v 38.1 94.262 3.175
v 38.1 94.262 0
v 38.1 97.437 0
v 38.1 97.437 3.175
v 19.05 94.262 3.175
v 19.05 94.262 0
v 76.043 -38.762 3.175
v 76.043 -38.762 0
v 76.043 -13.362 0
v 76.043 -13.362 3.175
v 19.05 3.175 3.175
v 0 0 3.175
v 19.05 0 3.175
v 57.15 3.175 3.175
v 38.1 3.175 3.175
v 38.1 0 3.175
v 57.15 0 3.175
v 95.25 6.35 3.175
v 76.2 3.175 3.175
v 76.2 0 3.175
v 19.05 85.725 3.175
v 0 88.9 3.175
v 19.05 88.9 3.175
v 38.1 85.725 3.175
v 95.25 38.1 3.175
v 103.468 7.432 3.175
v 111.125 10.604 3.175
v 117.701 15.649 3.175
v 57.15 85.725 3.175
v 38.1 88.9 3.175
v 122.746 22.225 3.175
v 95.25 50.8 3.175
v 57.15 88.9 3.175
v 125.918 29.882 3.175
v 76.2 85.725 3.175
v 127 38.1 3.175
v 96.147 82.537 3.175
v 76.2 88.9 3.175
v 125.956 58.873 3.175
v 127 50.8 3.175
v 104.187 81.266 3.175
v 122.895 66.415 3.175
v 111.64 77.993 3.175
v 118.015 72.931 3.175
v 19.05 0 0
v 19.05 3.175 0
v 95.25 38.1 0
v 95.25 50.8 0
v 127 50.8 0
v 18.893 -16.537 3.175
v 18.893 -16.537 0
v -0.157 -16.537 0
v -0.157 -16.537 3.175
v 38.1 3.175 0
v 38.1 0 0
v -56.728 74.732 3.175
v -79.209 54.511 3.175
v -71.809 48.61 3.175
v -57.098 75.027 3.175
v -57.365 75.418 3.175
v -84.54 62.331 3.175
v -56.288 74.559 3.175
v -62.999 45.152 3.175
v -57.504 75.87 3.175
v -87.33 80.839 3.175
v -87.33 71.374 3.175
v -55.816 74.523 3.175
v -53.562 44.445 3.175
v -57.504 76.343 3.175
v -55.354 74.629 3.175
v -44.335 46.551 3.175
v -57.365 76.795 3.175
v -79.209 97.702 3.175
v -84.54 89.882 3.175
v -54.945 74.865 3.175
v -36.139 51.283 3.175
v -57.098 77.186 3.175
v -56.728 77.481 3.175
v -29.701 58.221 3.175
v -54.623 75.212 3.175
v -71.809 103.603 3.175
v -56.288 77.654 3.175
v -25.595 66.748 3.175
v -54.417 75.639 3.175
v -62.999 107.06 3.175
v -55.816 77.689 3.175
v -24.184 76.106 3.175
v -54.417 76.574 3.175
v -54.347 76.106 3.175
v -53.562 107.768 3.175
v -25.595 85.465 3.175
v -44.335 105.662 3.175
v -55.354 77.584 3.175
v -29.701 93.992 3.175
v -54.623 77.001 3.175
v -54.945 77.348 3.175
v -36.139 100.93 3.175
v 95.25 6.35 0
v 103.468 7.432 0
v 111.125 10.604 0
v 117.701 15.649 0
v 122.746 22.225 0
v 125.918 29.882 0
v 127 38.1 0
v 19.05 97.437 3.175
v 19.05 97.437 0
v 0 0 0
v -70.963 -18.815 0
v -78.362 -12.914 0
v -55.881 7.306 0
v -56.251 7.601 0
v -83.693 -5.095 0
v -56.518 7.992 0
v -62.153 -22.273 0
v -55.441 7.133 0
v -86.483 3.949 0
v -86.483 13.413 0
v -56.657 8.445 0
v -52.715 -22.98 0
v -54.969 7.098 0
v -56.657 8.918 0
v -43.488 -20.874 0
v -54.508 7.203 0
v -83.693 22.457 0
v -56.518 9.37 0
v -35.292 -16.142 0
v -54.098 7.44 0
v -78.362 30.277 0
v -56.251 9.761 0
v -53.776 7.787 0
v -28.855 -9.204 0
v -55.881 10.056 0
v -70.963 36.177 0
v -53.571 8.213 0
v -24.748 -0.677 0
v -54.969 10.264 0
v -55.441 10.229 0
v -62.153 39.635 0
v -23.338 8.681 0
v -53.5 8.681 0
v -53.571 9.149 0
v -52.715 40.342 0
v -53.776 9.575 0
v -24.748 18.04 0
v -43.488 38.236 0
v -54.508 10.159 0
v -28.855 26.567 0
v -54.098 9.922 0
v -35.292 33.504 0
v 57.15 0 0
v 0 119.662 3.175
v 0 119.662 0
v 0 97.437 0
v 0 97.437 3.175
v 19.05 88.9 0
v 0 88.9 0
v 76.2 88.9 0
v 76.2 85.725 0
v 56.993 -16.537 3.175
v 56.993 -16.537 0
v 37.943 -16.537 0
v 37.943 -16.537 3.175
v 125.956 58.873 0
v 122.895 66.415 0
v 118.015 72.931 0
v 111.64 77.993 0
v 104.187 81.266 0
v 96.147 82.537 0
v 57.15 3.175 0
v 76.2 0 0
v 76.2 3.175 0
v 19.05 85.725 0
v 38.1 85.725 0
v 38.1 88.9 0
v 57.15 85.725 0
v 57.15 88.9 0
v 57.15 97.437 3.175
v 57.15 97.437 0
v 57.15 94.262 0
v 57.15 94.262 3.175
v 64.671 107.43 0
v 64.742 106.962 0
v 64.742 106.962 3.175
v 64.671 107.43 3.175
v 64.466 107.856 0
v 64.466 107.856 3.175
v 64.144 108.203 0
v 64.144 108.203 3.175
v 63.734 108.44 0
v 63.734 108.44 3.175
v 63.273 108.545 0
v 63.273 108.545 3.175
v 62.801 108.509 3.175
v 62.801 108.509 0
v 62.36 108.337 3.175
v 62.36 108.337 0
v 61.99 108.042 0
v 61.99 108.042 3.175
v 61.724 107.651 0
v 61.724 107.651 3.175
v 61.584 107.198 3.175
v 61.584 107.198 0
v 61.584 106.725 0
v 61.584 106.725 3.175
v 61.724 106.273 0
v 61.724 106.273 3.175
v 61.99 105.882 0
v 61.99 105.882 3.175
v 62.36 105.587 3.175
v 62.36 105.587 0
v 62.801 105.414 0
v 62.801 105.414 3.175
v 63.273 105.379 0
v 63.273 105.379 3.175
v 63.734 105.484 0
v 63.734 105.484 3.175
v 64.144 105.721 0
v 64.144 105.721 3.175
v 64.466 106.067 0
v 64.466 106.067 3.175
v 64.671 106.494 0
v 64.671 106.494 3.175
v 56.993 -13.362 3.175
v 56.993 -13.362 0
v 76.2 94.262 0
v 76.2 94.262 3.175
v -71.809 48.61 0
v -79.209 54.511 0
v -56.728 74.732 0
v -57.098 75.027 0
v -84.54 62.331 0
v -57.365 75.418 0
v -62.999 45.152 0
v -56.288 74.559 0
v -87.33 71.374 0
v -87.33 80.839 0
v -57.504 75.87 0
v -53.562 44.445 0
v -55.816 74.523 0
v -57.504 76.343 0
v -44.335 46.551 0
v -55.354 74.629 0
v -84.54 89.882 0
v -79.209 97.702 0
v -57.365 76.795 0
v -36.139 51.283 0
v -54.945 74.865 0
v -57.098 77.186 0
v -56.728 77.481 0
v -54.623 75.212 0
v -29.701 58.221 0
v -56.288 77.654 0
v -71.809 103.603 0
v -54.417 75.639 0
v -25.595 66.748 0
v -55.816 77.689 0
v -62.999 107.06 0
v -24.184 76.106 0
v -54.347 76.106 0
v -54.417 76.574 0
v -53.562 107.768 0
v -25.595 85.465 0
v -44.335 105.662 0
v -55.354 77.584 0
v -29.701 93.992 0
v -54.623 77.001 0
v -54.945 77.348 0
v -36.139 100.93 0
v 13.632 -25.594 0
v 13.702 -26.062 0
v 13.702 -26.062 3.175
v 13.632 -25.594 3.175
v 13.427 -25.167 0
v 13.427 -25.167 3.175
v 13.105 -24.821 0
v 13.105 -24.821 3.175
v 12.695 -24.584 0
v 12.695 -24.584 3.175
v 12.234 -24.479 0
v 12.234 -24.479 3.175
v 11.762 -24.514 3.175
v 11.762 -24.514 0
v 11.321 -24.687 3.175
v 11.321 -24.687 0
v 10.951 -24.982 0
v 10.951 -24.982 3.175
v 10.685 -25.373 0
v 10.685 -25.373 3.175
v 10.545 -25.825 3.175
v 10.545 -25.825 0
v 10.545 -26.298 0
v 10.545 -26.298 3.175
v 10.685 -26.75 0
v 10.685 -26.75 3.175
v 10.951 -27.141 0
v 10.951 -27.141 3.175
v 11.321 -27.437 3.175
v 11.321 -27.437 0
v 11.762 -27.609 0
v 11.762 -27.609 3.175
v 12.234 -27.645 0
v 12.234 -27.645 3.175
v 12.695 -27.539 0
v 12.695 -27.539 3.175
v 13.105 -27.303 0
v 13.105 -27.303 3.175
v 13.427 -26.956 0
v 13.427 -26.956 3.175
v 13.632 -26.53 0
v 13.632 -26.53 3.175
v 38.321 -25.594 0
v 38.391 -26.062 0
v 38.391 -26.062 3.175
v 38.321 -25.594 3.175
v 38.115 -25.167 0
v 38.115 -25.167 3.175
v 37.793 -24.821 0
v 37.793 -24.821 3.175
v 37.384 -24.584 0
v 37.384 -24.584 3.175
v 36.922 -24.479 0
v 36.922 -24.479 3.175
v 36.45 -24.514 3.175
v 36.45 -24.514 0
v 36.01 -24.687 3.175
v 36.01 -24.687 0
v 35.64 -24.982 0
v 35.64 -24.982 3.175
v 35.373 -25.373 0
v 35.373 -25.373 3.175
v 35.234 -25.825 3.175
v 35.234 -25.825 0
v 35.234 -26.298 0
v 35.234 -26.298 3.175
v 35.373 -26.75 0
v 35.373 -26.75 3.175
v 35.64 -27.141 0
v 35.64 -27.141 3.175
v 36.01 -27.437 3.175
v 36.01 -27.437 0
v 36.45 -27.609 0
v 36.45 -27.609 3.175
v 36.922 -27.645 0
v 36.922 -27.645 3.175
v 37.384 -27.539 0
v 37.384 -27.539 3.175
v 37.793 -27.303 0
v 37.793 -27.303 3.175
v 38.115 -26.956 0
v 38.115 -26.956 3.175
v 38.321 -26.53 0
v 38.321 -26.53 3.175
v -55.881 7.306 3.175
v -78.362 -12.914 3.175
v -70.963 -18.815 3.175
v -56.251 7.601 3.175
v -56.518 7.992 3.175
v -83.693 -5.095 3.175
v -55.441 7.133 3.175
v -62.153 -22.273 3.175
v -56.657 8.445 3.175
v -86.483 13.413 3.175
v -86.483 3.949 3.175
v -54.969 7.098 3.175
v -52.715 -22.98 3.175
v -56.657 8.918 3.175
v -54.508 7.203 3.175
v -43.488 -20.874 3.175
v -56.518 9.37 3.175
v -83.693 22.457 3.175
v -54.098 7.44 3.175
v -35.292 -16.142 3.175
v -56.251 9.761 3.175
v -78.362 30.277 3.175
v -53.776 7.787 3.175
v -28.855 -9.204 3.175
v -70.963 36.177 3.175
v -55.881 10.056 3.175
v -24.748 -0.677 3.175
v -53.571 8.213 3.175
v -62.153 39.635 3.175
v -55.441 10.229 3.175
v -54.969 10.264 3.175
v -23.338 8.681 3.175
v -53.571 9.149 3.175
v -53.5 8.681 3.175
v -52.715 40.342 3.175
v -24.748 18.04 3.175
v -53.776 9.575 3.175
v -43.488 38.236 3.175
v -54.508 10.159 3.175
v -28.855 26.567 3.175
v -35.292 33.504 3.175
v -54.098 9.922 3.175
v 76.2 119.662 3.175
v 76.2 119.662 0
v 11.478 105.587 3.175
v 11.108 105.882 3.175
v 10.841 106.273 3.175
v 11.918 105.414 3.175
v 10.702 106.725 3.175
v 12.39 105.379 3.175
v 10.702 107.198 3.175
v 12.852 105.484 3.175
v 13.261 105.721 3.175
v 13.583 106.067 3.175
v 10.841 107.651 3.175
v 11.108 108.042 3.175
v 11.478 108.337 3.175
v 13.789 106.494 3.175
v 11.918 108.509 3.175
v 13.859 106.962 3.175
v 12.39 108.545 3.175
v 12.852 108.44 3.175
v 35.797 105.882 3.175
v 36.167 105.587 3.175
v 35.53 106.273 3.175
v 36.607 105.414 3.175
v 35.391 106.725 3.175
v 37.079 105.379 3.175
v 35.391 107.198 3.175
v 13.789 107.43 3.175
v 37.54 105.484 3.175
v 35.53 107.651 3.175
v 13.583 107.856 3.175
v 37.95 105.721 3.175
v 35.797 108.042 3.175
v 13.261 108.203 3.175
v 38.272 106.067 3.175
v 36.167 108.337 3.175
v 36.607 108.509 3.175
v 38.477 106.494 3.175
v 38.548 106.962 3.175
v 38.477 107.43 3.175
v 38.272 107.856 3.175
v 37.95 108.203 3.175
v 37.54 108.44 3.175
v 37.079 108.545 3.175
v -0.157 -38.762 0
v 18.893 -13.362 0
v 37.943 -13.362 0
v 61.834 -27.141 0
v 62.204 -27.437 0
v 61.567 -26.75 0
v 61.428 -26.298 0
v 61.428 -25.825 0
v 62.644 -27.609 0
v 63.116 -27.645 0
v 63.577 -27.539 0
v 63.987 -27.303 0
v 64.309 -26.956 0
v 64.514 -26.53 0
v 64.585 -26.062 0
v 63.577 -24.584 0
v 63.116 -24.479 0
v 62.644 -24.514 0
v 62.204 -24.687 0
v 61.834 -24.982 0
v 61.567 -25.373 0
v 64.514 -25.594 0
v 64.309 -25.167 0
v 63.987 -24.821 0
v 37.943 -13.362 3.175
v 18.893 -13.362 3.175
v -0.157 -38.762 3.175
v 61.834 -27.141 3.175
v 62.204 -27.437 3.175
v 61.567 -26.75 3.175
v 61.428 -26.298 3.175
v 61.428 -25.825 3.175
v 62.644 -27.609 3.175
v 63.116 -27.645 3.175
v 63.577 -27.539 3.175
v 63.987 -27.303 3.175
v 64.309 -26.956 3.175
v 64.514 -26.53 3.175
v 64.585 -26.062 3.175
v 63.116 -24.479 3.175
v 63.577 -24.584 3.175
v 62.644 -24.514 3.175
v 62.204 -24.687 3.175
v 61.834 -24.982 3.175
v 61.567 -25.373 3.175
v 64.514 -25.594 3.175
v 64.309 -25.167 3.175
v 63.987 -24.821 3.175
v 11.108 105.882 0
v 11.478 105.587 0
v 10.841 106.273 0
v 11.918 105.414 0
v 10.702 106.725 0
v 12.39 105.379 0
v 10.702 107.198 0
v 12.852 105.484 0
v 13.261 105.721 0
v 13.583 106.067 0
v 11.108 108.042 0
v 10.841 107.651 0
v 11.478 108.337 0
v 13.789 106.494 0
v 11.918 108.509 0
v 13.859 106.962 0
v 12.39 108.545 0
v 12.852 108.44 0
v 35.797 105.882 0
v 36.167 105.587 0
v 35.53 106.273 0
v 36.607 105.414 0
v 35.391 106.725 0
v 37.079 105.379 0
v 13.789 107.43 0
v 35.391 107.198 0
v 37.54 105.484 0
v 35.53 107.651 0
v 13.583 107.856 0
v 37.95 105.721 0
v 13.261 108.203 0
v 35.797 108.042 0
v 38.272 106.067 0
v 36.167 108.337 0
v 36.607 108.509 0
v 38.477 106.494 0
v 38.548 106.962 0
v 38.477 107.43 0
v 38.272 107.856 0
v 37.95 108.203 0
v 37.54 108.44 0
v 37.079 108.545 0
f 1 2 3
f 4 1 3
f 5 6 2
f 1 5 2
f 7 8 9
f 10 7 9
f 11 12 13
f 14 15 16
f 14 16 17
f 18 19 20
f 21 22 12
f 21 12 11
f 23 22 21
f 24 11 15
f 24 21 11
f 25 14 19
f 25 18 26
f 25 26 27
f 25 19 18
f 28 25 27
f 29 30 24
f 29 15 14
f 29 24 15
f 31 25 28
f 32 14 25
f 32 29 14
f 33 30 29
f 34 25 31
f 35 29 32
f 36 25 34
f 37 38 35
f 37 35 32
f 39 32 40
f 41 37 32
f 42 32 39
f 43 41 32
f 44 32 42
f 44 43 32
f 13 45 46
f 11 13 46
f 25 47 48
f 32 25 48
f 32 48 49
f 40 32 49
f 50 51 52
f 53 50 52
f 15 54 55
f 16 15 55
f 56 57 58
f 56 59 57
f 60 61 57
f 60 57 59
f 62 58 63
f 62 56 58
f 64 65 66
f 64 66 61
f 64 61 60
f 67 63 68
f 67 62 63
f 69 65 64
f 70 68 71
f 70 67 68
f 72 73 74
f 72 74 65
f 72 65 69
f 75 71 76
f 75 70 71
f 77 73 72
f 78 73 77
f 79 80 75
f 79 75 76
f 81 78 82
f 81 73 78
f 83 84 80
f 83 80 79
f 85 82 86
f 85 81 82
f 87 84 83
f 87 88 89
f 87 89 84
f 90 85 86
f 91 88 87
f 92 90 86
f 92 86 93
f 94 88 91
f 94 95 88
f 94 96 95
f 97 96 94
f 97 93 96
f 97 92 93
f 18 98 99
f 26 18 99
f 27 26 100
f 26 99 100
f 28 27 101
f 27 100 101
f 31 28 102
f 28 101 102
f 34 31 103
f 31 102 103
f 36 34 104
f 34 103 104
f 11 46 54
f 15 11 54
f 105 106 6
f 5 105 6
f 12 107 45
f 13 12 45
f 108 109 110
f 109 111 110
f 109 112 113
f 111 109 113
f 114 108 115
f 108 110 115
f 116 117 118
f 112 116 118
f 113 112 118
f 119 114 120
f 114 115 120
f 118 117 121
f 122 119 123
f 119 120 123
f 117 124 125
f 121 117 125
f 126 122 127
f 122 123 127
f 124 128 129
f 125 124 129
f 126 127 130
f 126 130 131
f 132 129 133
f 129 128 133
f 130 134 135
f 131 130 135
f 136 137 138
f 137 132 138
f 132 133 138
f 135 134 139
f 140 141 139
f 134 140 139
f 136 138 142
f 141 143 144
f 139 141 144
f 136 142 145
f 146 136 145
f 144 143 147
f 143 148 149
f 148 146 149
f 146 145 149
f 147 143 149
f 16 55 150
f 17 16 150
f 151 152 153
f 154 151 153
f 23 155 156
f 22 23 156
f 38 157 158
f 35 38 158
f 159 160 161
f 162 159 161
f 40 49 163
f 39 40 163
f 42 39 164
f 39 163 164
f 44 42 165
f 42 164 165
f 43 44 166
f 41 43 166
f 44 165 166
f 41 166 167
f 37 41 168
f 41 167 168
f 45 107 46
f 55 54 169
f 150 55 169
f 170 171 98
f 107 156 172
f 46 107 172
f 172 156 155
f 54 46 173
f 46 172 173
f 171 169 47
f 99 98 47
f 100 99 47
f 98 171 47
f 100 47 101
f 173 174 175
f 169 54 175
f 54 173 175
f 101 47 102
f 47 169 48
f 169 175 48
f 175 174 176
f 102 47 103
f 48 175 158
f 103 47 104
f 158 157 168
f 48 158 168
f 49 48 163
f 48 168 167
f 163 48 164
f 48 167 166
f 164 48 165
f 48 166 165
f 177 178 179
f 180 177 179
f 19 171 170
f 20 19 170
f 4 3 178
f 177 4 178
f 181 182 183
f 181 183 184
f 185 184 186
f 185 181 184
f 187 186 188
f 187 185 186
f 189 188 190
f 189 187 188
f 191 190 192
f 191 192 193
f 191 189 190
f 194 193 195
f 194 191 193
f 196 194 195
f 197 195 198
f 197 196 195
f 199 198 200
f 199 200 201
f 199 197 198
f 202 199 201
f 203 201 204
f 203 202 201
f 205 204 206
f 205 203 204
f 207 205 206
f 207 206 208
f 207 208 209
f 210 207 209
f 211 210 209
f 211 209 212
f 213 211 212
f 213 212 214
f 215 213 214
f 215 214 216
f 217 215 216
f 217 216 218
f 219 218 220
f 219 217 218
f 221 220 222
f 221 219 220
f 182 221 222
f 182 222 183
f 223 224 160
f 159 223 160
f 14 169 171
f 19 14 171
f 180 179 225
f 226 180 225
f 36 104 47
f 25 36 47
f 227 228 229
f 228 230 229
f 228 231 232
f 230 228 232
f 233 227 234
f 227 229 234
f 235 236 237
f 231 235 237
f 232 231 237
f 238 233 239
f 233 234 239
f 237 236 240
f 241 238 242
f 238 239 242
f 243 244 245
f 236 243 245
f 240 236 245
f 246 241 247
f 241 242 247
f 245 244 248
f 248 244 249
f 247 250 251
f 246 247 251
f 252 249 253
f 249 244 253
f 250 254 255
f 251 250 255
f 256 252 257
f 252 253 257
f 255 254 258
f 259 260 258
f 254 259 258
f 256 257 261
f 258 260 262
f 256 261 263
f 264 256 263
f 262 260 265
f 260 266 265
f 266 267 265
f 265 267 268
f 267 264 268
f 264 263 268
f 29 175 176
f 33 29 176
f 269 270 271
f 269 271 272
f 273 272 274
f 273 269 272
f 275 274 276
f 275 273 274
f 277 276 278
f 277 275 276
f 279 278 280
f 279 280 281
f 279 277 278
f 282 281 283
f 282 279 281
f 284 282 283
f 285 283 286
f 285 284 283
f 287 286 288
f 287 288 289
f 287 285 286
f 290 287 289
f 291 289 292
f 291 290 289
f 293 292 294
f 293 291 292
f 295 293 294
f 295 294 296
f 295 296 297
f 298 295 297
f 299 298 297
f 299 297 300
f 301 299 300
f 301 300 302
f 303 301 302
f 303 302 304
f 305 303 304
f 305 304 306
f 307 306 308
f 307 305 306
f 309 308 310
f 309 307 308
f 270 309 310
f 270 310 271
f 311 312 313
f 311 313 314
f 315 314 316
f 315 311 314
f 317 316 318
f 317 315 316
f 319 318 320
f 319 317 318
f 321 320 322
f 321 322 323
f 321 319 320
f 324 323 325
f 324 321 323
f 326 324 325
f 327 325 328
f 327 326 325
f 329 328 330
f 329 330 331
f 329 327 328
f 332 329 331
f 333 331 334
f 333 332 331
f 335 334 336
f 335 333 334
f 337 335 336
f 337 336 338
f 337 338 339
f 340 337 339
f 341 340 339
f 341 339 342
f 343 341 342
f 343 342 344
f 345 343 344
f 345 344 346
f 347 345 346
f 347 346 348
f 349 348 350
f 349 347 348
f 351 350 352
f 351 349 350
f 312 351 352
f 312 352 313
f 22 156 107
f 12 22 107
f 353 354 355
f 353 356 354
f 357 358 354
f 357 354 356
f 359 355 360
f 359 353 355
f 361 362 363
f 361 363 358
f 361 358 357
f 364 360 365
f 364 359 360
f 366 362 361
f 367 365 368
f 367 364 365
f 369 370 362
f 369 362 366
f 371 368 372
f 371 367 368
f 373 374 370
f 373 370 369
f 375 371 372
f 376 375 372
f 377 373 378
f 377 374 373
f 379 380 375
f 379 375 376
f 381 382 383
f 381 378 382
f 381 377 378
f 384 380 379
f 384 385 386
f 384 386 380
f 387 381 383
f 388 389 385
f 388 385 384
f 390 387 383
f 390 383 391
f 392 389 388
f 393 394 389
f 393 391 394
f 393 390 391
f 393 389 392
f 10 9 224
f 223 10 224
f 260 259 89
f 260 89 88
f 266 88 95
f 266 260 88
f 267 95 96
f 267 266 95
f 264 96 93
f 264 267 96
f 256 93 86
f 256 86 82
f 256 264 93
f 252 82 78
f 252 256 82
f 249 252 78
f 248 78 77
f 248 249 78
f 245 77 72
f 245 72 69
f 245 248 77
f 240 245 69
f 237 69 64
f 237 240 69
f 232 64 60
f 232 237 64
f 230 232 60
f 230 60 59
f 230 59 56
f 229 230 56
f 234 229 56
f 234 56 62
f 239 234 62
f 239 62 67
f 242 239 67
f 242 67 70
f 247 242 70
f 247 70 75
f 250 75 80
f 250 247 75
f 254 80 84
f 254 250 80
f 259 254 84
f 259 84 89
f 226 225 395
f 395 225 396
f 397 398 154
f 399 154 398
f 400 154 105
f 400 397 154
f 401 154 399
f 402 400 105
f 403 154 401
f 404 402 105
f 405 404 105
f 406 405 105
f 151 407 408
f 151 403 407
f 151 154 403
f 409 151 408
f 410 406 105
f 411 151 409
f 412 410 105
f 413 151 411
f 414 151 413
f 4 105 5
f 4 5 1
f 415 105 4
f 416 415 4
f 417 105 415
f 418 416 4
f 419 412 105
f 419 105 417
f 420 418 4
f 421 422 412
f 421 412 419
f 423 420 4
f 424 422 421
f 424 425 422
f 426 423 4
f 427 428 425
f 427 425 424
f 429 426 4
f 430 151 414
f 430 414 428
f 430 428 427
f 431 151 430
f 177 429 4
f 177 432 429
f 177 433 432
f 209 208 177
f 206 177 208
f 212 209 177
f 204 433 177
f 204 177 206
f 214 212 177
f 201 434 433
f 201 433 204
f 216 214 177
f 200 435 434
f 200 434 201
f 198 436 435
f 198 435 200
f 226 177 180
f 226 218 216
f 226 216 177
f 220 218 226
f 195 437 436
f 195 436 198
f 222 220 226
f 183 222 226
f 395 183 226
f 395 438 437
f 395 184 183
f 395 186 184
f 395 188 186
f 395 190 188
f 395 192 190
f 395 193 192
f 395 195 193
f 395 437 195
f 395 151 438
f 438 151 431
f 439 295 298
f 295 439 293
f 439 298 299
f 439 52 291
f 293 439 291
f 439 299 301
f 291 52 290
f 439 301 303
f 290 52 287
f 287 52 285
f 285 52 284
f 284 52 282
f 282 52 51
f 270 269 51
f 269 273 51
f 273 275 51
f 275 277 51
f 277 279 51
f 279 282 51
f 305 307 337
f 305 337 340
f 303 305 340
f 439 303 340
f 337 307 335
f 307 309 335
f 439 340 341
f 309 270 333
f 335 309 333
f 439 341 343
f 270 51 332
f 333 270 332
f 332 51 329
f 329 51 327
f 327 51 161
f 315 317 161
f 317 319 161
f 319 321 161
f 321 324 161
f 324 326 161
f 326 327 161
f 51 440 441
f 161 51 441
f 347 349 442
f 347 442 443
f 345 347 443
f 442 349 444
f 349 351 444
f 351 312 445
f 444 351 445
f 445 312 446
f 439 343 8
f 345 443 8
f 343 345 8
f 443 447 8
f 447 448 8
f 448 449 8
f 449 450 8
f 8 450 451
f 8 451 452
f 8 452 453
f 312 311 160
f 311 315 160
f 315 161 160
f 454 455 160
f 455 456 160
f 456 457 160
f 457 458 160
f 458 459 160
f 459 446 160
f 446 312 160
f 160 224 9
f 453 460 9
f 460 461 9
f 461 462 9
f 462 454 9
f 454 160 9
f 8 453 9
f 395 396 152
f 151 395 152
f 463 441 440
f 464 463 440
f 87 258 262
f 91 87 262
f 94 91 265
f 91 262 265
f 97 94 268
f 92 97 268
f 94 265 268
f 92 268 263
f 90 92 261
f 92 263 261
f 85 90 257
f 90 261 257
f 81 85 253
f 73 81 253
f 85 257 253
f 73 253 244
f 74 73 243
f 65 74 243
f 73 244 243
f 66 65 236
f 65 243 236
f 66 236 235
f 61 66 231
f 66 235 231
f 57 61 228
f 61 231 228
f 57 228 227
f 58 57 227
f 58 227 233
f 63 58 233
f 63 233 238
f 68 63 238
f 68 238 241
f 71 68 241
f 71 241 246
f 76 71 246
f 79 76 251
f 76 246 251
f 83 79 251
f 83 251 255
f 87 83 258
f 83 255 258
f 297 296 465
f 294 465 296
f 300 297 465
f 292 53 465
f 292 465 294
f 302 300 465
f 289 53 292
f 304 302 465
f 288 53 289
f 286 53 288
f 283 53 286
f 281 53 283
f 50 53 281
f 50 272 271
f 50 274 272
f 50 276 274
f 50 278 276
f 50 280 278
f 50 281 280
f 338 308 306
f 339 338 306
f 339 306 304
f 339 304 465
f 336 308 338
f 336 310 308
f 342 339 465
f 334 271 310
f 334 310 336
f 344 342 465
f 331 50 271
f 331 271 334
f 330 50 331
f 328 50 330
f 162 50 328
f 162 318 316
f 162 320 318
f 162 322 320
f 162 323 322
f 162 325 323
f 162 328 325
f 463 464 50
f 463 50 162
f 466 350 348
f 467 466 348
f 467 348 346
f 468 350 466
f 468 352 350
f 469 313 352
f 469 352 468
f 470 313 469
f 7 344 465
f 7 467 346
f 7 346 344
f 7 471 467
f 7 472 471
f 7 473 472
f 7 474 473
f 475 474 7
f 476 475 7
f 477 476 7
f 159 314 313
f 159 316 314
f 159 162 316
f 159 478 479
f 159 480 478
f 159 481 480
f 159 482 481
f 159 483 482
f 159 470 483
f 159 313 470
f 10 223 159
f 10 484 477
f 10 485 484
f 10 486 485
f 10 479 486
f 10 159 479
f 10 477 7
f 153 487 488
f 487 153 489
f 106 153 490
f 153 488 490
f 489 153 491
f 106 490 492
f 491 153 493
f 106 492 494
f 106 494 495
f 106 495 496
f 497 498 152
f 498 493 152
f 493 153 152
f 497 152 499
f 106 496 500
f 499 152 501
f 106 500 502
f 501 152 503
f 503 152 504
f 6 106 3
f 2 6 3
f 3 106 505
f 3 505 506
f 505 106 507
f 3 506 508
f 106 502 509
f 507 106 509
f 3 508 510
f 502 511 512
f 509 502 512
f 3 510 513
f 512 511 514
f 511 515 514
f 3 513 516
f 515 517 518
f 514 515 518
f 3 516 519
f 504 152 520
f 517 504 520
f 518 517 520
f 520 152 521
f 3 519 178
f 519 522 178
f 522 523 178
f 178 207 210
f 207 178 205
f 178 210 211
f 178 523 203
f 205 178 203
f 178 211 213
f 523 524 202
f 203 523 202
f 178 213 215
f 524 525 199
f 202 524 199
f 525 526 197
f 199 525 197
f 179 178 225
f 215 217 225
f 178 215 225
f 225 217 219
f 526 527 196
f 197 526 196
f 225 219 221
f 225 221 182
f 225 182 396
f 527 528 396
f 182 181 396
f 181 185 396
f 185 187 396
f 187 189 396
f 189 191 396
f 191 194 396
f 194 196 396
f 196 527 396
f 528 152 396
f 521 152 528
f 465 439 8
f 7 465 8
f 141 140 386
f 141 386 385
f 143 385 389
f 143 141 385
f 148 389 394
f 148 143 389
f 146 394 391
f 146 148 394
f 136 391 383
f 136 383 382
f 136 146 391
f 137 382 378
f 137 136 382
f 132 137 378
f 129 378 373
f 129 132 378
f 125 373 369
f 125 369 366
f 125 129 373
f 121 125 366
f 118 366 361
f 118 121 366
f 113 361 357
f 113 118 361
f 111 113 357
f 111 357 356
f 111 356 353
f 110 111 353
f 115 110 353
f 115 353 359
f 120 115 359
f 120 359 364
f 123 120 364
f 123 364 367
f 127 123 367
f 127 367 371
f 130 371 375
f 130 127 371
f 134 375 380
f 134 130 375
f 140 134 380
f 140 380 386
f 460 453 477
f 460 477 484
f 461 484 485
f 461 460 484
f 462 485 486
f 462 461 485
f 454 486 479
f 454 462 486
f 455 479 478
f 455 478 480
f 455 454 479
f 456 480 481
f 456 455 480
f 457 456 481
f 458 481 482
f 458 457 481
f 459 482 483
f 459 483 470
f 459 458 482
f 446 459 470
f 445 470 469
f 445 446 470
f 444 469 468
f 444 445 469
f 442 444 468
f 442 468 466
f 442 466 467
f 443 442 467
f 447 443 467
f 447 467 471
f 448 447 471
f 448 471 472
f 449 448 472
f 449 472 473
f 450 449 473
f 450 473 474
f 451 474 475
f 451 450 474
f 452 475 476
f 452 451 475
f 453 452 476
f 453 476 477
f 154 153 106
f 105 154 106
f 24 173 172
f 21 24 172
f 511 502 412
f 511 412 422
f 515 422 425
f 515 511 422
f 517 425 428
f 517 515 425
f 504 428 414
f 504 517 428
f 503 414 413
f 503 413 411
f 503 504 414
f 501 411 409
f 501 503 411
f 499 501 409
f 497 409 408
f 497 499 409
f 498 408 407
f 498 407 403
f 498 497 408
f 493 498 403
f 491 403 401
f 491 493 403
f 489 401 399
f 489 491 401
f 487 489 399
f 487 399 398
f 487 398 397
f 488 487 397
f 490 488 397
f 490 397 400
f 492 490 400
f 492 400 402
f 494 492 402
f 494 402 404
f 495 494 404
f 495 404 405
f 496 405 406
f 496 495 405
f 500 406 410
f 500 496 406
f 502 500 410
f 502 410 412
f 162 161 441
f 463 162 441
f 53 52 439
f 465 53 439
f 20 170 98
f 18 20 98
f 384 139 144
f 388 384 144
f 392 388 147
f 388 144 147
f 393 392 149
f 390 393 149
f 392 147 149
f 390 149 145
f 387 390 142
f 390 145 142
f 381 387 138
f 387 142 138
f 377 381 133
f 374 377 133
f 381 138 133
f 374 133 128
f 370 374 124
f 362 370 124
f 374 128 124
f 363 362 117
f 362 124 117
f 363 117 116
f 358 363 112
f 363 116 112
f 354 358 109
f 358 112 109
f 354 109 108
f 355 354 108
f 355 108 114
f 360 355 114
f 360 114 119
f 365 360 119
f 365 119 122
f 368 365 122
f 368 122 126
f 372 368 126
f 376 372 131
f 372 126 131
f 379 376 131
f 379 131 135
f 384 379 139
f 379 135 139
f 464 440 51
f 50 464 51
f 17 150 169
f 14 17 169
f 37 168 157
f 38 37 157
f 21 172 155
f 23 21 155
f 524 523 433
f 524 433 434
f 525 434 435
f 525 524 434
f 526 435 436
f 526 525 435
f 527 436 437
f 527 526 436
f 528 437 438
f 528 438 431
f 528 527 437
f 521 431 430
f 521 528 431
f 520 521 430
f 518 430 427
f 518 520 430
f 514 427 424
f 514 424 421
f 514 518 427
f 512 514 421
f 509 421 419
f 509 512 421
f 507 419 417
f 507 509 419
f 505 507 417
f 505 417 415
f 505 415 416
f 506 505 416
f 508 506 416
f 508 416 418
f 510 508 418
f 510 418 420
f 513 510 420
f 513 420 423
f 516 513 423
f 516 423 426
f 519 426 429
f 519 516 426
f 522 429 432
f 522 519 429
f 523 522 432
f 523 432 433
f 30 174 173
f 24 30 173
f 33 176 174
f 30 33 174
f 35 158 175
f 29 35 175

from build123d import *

# Parameters (mm, degrees)
F0_R     = 1.5875
F1_DEPTH = 3.175
F0_R_2   = 31.75


# Not quite as in the source:
# - a feature names something its author has since deleted; it is built from what else it names


with BuildPart() as f1:
    # F0 (on Top) → F1 (new body)
    with BuildSketch(Plane.XY):
        Polygon((19.05, 97.4367505789), (19.05, 94.2617505789), (38.1, 94.2617505789), (38.1, 97.4367505789), (57.15, 97.4367505789), (57.15, 94.2617505789), (76.2, 94.2617505789), (76.2, 119.6617505789), (50.8, 119.6617505789), (0, 119.6617505789), (0, 97.4367505789), align=None)
        with Locations((12.2715613582, 106.9617505789)):
            Circle(F0_R, mode=Mode.SUBTRACT)
        with Locations((36.9603613582, 106.9617505789)):
            Circle(F0_R, mode=Mode.SUBTRACT)
        with Locations((63.1541113582, 106.9617505789)):
            Circle(F0_R, mode=Mode.SUBTRACT)
    extrude(amount=F1_DEPTH)


with BuildPart() as f1b:
    # F0 (on Top) → F1, piece 2 (new body)
    with BuildSketch(Plane.XY):
        with BuildLine():
            Line((0, 88.9), (0, 0))
            Line((0, 0), (19.05, 0))
            Line((19.05, 0), (19.05, 3.175))
            Line((19.05, 3.175), (38.1, 3.175))
            Line((38.1, 3.175), (38.1, 0))
            Line((38.1, 0), (57.15, 0))
            Line((57.15, 0), (57.15, 3.175))
            Line((57.15, 3.175), (76.2, 3.175))
            Line((76.2, 3.175), (76.2, 0))
            Line((76.2, 0), (95.25, 6.35))
            ThreePointArc((95.25, 6.35), (117.7006403027, 15.6493596973), (127, 38.1))
            Line((127, 38.1), (95.25, 38.1))
            Line((95.25, 38.1), (95.25, 50.8))
            Line((95.25, 50.8), (127, 50.8))
            ThreePointArc((127, 50.8), (118.0154697598, 72.9313326895), (96.1467158039, 82.5373344937))
            Line((96.1467158039, 82.5373344937), (76.2, 88.9))
            Line((76.2, 88.9), (76.2, 85.725))
            Line((76.2, 85.725), (57.15, 85.725))
            Line((57.15, 85.725), (57.15, 88.9))
            Line((57.15, 88.9), (38.1, 88.9))
            Line((38.1, 88.9), (38.1, 85.725))
            Line((38.1, 85.725), (19.05, 85.725))
            Line((19.05, 85.725), (19.05, 88.9))
            Line((19.05, 88.9), (0, 88.9))
        make_face()
    extrude(amount=F1_DEPTH)


with BuildPart() as f1c:
    # F0 (on Top) → F1, piece 3 (new body)
    with BuildSketch(Plane.XY):
        with Locations((-55.9344552457, 76.1064253747)):
            Circle(F0_R_2)
        with Locations((-55.9344552457, 76.1064253747)):
            Circle(F0_R, mode=Mode.SUBTRACT)
    extrude(amount=F1_DEPTH)


with BuildPart() as f1d:
    # F0 (on Top) → F1, piece 4 (new body)
    with BuildSketch(Plane.XY):
        with Locations((-55.0876557827, 8.6811911315)):
            Circle(F0_R_2)
        with Locations((-55.0876557827, 8.6811911315)):
            Circle(F0_R, mode=Mode.SUBTRACT)
    extrude(amount=F1_DEPTH)


with BuildPart() as f1e:
    # F0 (on Top) → F1, piece 5 (new body)
    with BuildSketch(Plane.XY):
        Polygon((18.8933457804, -16.5366958239), (-0.1566542196, -16.5366958239), (-0.1566542196, -38.7616958239), (36.8386008513, -38.7616958239), (76.0433457804, -38.7616958239), (76.0433457804, -13.3616958239), (56.9933457804, -13.3616958239), (56.9933457804, -16.5366958239), (37.9433457804, -16.5366958239), (37.9433457804, -13.3616958239), (18.8933457804, -13.3616958239), align=None)
        with Locations((12.1149071386, -26.0616958239)):
            Circle(F0_R, mode=Mode.SUBTRACT)
        with Locations((36.8037071386, -26.0616958239)):
            Circle(F0_R, mode=Mode.SUBTRACT)
        with Locations((62.9974571386, -26.0616958239)):
            Circle(F0_R, mode=Mode.SUBTRACT)
    extrude(amount=F1_DEPTH)


solid = Compound([f1.part, f1b.part, f1c.part, f1d.part, f1e.part])
